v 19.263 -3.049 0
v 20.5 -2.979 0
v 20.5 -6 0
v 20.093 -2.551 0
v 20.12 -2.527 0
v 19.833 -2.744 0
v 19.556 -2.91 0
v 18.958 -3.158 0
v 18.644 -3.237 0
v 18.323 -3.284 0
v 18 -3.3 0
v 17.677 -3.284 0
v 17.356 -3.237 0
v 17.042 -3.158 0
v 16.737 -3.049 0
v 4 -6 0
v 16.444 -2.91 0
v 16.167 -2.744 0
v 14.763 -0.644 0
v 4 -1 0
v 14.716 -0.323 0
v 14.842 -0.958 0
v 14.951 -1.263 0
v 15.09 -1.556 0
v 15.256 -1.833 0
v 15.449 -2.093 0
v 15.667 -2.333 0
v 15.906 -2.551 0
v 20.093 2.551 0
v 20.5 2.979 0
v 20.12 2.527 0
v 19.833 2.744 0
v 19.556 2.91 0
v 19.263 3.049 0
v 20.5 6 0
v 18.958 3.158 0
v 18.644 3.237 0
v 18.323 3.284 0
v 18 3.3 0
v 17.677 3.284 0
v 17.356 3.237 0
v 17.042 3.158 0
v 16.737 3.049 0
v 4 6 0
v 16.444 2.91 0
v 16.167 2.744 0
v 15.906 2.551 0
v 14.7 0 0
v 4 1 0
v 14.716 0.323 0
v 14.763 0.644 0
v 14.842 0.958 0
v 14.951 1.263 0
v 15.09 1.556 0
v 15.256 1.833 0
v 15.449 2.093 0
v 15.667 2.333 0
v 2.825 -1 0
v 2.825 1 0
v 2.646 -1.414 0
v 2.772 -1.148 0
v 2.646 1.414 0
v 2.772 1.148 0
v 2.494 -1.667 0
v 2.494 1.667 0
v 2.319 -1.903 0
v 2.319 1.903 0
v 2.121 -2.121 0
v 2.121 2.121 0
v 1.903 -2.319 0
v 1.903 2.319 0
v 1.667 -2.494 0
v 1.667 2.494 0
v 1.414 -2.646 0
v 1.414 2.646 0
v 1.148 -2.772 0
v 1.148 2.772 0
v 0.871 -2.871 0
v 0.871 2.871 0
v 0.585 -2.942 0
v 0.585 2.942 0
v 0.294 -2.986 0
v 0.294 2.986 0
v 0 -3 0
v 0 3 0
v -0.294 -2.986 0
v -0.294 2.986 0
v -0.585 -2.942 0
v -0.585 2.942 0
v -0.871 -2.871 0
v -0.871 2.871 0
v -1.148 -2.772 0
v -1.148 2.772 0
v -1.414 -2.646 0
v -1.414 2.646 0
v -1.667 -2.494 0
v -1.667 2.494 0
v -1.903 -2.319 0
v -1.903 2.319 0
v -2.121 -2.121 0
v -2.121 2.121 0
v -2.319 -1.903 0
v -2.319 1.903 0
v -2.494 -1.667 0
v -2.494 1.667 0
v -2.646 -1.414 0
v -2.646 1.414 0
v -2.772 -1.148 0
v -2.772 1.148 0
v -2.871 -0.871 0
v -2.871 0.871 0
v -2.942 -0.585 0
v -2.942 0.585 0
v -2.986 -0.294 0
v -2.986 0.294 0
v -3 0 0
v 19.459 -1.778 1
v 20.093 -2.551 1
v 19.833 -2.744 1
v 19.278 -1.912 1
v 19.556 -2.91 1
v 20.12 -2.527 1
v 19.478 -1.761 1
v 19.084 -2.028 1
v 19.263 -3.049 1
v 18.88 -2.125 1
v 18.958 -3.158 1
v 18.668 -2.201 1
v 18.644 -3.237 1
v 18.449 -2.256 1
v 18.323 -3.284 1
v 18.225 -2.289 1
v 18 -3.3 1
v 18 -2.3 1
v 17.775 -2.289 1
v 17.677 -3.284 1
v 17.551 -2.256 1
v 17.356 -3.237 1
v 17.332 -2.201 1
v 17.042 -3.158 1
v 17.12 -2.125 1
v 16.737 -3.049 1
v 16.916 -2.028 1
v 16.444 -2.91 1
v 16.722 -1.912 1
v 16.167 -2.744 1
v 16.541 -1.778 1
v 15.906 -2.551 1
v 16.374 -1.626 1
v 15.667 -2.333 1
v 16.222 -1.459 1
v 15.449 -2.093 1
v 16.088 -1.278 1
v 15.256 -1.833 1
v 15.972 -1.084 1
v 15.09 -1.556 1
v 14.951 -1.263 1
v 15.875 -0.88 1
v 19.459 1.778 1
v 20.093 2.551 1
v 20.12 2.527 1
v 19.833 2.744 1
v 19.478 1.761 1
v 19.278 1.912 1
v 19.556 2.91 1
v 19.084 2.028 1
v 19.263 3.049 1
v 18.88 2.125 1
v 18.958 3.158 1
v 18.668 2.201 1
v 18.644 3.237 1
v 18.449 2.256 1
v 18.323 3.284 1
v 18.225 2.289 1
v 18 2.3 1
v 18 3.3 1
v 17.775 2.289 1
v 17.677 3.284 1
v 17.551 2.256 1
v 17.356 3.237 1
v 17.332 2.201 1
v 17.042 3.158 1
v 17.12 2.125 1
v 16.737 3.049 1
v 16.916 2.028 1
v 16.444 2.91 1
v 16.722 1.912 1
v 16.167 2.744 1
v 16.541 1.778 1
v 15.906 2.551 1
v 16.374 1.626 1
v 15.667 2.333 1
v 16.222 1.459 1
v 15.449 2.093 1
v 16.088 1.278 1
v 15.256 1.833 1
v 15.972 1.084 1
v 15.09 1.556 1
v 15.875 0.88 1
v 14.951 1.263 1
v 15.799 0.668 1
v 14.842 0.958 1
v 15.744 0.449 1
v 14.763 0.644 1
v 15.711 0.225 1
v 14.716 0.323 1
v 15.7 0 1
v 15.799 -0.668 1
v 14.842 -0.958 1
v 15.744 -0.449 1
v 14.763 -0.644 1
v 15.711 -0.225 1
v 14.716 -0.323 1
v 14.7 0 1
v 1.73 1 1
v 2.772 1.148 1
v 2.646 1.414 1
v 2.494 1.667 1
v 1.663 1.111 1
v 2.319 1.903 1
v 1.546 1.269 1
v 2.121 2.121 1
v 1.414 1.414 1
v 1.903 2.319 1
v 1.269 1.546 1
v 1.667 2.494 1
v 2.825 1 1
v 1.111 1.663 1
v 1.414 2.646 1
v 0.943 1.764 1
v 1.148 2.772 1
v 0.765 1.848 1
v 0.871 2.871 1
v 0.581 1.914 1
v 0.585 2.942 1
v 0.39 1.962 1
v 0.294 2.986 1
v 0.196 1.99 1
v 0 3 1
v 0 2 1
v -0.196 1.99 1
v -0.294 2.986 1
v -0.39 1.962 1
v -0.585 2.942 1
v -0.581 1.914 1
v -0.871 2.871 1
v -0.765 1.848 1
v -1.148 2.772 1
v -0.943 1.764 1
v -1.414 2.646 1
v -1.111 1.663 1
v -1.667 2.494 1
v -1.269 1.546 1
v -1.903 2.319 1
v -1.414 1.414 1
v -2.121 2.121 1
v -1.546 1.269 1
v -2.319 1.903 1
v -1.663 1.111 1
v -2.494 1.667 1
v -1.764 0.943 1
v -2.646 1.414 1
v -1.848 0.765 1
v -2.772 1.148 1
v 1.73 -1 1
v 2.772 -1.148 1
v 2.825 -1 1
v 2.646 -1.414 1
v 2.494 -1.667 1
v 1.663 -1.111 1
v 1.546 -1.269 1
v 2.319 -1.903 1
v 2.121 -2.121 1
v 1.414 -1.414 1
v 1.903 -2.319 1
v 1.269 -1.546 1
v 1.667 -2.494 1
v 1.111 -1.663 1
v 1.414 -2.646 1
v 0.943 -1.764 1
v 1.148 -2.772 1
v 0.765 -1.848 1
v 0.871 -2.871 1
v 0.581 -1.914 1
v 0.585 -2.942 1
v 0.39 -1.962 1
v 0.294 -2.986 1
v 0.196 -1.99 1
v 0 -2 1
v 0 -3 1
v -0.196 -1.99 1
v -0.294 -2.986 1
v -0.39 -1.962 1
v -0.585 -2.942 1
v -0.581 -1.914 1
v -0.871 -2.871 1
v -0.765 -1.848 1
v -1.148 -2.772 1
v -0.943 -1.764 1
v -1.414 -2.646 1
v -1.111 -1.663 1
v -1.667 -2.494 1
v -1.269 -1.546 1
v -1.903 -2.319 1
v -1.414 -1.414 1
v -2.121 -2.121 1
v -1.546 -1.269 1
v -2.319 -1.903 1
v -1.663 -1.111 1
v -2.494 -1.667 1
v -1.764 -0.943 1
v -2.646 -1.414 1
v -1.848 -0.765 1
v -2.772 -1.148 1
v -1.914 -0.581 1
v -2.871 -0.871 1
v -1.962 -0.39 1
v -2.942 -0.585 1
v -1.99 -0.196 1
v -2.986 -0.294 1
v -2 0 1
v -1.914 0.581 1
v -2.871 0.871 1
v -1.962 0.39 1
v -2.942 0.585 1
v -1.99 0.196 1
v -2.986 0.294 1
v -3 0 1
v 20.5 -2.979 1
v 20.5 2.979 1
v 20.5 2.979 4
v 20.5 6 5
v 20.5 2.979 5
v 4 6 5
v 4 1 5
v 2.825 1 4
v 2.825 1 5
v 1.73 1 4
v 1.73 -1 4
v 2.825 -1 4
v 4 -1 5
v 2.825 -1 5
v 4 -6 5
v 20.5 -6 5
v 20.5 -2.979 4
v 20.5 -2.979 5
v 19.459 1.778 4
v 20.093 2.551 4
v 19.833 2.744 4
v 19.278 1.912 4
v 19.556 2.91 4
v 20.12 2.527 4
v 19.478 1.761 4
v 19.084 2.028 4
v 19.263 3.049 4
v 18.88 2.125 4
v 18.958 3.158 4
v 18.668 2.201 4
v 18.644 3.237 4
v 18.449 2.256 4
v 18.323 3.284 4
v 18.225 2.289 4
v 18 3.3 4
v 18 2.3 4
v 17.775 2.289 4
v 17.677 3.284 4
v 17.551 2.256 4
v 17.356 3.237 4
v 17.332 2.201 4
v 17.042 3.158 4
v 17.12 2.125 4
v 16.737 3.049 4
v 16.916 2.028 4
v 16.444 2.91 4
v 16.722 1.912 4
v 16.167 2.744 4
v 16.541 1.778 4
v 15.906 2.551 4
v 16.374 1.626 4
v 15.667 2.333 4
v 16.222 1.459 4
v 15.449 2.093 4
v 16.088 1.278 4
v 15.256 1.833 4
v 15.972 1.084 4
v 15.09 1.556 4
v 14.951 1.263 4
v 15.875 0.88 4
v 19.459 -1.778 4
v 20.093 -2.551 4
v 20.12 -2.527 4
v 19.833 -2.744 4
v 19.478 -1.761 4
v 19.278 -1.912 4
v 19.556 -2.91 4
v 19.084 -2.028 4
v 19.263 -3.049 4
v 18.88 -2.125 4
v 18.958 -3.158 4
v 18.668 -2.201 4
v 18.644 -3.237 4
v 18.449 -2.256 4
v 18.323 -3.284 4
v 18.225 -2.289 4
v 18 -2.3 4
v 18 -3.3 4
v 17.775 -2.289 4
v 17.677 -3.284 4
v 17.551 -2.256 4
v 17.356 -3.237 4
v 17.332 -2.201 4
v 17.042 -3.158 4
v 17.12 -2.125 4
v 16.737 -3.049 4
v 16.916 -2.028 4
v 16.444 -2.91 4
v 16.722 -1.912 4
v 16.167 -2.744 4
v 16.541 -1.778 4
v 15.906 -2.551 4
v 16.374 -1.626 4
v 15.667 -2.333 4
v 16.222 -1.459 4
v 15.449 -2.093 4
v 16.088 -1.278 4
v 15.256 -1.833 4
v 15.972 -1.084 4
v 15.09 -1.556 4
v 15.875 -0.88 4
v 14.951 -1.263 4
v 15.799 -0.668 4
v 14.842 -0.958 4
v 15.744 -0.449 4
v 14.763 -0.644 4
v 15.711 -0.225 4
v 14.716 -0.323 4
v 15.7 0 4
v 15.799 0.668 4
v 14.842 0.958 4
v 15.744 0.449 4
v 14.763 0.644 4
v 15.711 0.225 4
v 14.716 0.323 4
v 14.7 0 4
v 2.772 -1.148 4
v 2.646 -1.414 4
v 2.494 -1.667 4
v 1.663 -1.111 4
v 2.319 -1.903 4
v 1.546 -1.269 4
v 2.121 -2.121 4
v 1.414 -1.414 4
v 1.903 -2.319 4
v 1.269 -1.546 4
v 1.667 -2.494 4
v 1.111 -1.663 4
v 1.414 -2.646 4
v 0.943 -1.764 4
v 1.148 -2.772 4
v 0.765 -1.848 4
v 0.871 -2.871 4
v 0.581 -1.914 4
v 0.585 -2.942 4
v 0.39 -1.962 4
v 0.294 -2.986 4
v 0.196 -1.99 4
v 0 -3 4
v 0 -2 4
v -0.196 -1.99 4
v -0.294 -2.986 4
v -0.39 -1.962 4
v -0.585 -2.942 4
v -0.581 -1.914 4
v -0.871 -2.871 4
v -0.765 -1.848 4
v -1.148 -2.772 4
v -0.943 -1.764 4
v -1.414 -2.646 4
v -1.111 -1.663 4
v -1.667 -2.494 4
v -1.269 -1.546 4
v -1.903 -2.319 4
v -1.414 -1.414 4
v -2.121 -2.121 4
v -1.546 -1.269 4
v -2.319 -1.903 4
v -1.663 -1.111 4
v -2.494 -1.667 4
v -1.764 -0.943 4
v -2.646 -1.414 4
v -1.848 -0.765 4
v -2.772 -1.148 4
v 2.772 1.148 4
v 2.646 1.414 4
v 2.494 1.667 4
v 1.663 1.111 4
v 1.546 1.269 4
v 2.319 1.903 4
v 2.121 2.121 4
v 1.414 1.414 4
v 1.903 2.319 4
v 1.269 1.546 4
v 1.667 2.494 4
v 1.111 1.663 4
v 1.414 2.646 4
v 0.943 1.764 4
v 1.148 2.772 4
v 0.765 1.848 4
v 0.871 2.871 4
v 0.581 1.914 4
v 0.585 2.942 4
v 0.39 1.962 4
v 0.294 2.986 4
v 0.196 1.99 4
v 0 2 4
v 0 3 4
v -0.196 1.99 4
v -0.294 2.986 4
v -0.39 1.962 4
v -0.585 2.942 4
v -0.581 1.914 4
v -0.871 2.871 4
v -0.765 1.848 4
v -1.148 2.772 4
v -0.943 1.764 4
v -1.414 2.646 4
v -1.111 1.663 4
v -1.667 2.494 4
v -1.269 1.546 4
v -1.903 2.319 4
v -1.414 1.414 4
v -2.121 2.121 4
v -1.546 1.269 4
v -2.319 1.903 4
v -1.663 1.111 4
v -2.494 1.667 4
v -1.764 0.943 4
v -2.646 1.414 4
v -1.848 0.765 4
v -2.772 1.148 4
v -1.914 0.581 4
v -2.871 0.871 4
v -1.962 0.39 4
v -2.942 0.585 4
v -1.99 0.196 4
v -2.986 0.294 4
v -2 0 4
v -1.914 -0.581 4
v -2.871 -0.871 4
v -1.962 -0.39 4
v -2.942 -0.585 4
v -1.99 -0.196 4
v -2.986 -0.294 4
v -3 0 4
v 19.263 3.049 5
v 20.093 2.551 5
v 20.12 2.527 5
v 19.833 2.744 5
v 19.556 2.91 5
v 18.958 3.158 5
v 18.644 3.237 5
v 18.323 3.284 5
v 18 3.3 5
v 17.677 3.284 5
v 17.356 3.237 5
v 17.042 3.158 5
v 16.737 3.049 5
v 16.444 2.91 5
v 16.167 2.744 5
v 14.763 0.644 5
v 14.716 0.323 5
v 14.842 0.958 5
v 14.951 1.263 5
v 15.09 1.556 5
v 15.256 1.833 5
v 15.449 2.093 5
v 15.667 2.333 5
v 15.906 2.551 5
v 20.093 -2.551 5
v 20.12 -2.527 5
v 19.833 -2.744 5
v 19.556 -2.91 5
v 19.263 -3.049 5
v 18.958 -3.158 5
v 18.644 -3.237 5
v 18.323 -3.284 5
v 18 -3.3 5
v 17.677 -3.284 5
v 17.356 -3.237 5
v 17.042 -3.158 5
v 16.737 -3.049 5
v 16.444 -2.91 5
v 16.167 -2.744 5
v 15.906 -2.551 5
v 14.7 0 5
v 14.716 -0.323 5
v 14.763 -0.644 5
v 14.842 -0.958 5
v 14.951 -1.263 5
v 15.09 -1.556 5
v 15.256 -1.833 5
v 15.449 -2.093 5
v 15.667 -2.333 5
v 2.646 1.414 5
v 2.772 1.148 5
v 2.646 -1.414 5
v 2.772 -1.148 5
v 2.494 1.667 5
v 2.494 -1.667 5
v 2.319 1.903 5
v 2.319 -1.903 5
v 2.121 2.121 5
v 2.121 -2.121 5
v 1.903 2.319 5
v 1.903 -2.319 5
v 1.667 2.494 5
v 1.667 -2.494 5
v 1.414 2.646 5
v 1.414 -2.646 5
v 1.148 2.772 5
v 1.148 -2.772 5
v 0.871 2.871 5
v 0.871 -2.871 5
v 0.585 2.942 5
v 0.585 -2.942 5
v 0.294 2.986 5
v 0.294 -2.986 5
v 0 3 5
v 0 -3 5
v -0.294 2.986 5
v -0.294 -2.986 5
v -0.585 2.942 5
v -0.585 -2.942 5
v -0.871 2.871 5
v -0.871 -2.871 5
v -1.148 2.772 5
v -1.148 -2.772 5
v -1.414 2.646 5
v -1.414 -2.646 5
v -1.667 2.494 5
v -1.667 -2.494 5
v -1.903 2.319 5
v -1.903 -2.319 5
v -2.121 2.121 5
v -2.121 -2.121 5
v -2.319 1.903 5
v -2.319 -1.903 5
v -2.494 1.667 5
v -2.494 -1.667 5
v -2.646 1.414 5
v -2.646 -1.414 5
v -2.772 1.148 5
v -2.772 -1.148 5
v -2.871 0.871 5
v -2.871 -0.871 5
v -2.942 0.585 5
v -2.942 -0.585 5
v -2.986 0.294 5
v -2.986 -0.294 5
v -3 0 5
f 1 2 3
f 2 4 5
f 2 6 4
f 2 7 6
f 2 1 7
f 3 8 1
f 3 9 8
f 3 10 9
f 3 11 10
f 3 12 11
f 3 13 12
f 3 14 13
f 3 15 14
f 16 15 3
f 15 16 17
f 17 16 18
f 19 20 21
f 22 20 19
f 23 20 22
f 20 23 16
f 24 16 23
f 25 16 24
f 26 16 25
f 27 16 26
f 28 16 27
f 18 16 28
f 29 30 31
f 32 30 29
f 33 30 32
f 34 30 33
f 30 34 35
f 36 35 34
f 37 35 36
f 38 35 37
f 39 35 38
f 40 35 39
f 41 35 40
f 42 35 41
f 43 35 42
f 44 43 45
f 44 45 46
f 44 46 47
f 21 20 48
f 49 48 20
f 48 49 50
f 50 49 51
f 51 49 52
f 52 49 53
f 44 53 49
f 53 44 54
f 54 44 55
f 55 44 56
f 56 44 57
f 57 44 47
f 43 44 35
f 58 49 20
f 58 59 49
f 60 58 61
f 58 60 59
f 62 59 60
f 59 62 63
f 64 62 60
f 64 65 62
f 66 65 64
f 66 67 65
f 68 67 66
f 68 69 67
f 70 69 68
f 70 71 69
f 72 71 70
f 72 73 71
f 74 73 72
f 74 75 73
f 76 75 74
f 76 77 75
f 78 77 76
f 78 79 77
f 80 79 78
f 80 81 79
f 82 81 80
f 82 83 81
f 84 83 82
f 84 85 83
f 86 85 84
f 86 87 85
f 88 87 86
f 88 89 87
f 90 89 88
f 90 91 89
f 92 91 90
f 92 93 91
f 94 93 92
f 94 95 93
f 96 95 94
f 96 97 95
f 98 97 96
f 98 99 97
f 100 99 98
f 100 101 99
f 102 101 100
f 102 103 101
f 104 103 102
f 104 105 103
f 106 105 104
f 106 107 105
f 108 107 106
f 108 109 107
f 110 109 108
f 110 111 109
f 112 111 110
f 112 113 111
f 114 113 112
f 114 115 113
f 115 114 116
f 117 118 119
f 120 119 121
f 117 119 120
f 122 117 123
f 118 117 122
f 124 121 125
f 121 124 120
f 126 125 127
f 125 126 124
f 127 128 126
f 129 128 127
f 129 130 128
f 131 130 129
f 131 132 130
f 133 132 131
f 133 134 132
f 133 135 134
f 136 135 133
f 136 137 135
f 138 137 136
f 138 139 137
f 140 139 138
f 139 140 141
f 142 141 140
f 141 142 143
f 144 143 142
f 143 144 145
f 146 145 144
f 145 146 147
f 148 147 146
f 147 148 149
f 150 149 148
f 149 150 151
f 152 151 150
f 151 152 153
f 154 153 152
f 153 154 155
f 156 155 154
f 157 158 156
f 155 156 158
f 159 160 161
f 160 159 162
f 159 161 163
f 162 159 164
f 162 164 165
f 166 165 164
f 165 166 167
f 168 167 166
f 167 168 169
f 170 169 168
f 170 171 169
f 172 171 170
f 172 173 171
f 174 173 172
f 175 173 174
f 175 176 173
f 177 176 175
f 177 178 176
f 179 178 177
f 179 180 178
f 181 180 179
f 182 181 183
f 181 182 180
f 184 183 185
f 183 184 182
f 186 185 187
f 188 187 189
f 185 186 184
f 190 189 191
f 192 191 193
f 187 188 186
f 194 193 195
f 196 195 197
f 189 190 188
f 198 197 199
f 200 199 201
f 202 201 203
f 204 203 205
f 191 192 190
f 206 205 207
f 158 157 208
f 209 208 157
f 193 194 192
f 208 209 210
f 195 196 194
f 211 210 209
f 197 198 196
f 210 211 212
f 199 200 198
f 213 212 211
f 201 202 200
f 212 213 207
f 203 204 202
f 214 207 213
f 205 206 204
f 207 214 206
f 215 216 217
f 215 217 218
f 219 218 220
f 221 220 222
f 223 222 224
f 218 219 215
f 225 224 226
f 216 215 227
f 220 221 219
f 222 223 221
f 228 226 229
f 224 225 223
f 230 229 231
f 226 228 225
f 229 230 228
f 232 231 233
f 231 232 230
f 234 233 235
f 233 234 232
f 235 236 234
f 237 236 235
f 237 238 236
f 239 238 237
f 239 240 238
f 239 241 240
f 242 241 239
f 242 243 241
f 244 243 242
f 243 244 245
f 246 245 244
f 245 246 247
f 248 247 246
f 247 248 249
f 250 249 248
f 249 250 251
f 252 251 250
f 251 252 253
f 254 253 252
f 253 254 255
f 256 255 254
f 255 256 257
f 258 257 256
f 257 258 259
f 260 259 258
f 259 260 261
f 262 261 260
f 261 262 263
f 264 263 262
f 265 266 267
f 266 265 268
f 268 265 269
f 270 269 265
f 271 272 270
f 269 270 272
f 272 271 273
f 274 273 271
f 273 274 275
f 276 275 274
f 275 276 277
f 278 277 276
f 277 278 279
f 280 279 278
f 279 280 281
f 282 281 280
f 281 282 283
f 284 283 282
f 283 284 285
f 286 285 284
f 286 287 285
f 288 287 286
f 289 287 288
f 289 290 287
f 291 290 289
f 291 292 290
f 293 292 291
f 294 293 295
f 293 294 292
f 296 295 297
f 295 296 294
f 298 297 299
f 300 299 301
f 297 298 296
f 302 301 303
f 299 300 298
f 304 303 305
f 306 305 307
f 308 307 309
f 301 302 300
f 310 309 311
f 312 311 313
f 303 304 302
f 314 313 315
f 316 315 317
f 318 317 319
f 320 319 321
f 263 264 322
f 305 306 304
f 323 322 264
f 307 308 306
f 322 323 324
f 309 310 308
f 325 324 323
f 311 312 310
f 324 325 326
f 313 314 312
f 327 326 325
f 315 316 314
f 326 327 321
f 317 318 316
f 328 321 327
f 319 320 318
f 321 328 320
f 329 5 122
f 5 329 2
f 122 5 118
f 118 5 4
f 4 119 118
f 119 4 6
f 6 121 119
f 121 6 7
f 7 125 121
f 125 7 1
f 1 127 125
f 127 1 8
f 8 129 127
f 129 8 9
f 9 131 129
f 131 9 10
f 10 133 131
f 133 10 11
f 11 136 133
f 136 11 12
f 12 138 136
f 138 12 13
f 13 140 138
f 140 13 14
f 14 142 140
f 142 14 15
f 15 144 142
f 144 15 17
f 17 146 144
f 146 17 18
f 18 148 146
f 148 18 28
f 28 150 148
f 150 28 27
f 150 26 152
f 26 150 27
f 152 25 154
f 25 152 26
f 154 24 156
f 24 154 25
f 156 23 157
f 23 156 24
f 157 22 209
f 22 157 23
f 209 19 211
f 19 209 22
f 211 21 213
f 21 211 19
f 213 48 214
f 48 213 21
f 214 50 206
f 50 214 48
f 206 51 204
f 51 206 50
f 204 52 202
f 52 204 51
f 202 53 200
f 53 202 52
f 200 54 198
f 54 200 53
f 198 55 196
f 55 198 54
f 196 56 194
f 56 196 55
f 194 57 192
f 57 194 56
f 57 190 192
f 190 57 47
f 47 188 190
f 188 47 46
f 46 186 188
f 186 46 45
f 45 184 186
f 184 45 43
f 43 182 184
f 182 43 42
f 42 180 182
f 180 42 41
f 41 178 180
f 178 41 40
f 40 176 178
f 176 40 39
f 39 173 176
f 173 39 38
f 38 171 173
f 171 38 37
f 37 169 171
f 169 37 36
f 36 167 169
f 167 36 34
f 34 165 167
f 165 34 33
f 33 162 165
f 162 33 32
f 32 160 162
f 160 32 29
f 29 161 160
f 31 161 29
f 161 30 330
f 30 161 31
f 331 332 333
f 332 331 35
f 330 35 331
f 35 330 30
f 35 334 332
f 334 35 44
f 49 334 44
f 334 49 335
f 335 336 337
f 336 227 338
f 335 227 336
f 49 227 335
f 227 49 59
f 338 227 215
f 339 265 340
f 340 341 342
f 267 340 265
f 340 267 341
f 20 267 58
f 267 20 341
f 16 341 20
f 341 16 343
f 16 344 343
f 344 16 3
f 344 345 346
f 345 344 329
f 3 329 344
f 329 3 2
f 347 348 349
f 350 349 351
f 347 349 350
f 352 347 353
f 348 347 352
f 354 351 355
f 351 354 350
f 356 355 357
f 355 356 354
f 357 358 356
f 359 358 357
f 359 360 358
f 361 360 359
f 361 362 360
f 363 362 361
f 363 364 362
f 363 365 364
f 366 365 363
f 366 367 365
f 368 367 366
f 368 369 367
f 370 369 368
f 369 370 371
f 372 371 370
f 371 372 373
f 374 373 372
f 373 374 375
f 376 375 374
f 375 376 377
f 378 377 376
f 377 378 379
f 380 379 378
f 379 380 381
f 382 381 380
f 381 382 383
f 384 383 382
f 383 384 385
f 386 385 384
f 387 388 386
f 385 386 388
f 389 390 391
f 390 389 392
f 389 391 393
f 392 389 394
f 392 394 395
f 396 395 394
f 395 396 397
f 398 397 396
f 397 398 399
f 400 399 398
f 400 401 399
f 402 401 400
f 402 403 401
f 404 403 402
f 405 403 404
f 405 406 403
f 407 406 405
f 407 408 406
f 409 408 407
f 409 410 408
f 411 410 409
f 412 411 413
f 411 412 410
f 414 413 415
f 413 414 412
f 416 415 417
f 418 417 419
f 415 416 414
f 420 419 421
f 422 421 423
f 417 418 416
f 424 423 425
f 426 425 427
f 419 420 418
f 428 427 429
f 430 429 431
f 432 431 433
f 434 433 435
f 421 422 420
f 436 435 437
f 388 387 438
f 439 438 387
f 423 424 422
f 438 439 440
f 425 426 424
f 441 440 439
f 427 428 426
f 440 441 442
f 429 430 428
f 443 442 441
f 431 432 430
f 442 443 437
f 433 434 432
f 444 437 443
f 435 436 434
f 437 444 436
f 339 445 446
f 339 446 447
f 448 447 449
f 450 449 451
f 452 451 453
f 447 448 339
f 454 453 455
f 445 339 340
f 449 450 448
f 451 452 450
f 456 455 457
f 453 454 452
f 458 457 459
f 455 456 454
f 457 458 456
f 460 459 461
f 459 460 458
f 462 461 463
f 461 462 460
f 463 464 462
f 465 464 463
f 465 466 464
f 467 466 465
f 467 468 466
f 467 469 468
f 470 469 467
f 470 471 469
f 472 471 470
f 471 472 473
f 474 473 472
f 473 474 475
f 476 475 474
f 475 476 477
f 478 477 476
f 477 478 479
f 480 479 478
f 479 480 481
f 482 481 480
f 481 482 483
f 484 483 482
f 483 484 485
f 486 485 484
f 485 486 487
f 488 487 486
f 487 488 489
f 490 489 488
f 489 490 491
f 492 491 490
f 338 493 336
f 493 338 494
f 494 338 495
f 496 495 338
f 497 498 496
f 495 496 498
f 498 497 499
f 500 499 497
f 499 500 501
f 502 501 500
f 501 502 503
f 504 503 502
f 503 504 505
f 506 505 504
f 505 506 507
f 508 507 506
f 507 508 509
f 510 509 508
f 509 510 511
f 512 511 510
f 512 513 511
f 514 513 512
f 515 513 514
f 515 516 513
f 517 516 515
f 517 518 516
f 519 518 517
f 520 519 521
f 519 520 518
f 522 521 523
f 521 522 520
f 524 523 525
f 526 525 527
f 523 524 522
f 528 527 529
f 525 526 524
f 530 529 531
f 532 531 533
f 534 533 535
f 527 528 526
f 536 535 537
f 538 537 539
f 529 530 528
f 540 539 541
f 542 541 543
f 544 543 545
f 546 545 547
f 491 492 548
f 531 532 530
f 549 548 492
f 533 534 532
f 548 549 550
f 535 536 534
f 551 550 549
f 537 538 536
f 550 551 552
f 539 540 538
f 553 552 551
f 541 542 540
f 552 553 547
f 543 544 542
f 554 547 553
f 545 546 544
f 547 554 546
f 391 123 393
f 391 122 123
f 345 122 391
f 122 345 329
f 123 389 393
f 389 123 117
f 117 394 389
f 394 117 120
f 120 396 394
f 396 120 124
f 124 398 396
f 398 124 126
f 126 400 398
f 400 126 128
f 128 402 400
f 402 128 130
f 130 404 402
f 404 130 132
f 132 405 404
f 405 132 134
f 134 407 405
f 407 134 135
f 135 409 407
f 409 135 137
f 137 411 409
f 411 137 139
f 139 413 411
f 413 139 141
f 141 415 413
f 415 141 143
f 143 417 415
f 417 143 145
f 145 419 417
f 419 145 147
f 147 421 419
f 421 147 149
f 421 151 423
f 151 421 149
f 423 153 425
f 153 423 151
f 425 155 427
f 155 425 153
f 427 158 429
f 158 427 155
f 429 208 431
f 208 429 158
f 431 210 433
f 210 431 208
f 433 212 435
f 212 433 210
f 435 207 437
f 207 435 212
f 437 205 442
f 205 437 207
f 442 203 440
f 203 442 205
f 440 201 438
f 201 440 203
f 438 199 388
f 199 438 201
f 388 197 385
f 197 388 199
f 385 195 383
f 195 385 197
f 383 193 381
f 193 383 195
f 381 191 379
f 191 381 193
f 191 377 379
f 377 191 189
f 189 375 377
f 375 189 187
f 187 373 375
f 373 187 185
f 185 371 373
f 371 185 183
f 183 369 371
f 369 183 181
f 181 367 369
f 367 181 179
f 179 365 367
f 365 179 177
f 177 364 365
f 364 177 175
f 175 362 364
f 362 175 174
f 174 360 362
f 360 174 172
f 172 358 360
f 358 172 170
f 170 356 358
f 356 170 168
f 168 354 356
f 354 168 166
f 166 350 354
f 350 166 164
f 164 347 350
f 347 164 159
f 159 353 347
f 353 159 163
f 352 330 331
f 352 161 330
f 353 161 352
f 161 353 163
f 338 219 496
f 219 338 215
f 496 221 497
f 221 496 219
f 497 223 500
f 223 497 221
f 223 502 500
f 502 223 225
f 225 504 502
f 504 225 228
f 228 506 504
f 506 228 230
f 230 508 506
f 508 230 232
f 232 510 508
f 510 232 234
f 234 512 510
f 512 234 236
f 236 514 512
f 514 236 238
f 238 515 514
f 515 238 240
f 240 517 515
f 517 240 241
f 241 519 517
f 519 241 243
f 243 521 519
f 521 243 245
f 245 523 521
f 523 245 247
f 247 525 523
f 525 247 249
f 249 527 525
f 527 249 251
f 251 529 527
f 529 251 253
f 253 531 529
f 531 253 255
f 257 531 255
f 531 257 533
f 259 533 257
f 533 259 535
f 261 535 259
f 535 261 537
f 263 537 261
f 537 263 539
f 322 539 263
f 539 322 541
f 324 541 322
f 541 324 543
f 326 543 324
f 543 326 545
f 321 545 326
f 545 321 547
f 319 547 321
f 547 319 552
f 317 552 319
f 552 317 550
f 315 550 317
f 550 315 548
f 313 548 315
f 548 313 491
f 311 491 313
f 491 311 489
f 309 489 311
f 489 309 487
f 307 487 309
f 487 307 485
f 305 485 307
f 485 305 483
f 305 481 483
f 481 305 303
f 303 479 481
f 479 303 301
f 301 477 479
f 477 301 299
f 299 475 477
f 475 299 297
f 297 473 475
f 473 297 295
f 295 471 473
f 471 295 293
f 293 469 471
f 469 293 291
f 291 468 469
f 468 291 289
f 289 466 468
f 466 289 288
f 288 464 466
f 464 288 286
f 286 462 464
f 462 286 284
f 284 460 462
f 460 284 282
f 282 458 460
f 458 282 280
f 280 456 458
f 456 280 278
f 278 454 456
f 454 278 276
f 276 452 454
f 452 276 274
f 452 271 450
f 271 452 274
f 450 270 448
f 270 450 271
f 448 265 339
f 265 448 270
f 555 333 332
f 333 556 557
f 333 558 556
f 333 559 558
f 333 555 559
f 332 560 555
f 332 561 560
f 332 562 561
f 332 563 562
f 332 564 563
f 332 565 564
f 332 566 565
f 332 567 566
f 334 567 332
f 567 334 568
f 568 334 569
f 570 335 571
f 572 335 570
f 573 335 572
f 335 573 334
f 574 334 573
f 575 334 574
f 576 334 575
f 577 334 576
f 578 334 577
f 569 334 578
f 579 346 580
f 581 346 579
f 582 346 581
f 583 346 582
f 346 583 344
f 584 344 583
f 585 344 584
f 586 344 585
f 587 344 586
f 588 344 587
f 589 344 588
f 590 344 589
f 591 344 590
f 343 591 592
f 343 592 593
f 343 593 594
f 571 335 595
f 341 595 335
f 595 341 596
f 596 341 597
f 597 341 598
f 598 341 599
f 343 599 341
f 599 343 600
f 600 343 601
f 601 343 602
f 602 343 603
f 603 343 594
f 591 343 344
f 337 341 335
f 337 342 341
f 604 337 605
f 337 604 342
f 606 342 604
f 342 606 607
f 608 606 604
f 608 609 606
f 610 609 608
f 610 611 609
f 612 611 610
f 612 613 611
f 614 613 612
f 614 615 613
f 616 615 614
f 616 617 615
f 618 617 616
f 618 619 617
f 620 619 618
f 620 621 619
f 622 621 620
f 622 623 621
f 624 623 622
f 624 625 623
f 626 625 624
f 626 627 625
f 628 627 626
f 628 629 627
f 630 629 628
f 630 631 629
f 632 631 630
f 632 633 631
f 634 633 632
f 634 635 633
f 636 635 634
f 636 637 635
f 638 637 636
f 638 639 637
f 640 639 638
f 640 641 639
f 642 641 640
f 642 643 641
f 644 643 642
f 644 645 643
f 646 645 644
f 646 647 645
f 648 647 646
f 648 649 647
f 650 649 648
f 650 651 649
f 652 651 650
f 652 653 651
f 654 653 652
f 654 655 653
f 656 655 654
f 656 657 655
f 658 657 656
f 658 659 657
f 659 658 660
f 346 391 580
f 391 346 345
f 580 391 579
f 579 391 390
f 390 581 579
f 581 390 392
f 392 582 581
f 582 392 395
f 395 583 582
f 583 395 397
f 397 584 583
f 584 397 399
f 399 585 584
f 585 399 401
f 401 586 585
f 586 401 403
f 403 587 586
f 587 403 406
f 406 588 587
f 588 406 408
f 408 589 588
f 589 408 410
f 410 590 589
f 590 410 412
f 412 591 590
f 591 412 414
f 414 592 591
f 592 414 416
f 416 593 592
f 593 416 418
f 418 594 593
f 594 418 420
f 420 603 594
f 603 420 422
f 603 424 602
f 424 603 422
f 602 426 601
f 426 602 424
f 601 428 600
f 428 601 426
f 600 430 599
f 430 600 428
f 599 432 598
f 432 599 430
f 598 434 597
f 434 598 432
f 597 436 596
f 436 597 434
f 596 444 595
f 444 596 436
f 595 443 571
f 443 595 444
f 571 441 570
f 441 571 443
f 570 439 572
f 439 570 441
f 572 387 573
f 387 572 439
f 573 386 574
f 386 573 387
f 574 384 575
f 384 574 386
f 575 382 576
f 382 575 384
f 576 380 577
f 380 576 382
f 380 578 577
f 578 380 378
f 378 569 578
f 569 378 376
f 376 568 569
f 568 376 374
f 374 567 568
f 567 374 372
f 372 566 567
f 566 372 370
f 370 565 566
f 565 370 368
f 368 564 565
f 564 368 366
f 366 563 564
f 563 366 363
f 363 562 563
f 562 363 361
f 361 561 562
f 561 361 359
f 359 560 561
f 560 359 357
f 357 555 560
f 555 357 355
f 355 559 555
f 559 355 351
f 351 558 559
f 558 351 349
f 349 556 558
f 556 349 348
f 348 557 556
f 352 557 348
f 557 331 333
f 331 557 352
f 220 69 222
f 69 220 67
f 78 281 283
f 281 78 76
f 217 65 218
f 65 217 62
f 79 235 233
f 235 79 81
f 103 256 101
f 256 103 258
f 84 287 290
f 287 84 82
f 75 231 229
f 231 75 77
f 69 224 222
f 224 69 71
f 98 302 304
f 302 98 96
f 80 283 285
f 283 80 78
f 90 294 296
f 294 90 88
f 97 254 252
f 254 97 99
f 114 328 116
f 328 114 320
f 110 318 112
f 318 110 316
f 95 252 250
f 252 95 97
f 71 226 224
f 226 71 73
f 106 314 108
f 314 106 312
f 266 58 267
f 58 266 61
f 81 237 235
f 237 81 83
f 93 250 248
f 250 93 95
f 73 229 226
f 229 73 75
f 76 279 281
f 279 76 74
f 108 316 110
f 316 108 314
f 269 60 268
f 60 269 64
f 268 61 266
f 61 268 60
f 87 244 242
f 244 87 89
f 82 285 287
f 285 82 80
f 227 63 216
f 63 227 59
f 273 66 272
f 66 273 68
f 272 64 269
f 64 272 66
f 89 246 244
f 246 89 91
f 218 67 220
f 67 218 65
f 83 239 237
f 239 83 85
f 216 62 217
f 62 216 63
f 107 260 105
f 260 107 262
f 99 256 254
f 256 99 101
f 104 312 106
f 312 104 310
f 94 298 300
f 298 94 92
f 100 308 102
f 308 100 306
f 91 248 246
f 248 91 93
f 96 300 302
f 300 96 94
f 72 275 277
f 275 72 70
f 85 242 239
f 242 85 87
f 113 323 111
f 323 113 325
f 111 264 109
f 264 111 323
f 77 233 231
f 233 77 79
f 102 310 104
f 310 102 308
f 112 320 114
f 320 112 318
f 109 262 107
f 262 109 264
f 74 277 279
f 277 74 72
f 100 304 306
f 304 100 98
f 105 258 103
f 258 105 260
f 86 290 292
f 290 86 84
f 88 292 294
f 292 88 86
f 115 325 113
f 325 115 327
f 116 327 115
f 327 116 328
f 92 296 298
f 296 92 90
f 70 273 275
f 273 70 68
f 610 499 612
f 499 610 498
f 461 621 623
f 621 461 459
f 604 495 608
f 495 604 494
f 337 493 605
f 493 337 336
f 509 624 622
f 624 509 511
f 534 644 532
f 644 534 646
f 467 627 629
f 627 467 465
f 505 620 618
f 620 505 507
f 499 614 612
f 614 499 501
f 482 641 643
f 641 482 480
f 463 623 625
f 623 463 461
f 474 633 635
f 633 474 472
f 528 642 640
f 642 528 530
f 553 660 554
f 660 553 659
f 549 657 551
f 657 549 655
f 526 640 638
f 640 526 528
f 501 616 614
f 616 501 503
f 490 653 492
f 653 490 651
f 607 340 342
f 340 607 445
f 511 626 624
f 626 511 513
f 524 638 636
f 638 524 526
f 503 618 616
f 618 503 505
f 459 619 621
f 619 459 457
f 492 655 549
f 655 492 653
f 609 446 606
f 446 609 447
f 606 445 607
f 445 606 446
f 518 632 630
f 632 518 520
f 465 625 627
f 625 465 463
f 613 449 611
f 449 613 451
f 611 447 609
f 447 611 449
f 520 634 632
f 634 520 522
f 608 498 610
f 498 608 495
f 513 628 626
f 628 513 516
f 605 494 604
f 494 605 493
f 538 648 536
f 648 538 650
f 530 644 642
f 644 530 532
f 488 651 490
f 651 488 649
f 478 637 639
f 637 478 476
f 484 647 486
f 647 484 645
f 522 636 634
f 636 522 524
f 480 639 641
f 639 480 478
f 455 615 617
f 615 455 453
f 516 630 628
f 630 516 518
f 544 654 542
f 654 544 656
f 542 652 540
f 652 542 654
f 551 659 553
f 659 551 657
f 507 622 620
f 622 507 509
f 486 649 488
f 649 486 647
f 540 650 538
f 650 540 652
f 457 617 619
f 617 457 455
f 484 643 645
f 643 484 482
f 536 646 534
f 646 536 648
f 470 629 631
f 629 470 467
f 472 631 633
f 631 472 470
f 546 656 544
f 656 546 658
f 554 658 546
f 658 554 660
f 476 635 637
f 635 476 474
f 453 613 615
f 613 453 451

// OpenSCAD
part = "link"; // [link, assembly]
cadverify_only = "";
module instance(name, part, unit = 1) {
    echo(cadverify_instance = [name, part, unit]);
    if (cadverify_only == "" || cadverify_only == name) children();
}

// Parameters (mm)
pitch = 18;          // pin-to-bore distance
link_w = 12;         // width (Y)
link_t = 5;          // thickness (Z)
pin_d = 4;           // pin shaft diameter
bore_d = 4.6;        // bore diameter (0.3 radial clearance)
cap_d = 6;           // cap diameter
cap_h = 1;           // cap thickness
gap_z = 0.3;         // vertical clearance cap<->knuckle
kn_out_d = 7.6;      // knuckle outer diameter (1.5 wall)
cap_cav_d = 6.6;     // cap cavity diameter (0.3 radial clearance)
neck_w = 2;          // neck width
slot_half = 50;      // slot half-angle (deg), allows +-30 deg swing
yoke_east = 20.5;    // full-height yoke east extent (local X)
$fn = 64;

module link_geom() {
    bore_x = pitch;
    pin_r = pin_d/2;
    bore_r = bore_d/2;
    kn_out_r = kn_out_d/2;
    cav_r = cap_cav_d/2;
    cap_r = cap_d/2;
    wedge_far = 30;
    dy_far = wedge_far * tan(slot_half);
    // 2D profiles
    // base footprint (bottom/top): pin disc + neck + yoke rect
    // mid footprint: base + knuckle outer disc
    bot_h = cap_h;            // 0..1
    mid_h = link_t - 2*cap_h; // 1..4
    // bottom layer z 0..1, hole = cap cavity r3.3
    translate([0,0,0]) linear_extrude(height = bot_h, convexity = 8) {
        difference() {
            union() {
                circle(r = pin_r);
                translate([0,-neck_w/2]) square([5, neck_w]);
                translate([4,-link_w/2]) square([yoke_east-4, link_w]);
            }
            translate([bore_x,0]) circle(r = cav_r);
            polygon(points = [[bore_x,0],[bore_x+wedge_far, dy_far],[bore_x+wedge_far, -dy_far]]);
        }
    }
    // middle layer z 1..4, hole = bore r2.3
    translate([0,0,bot_h]) linear_extrude(height = mid_h, convexity = 8) {
        difference() {
            union() {
                circle(r = pin_r);
                translate([0,-neck_w/2]) square([5, neck_w]);
                translate([4,-link_w/2]) square([yoke_east-4, link_w]);
                translate([bore_x,0]) circle(r = kn_out_r);
            }
            translate([bore_x,0]) circle(r = bore_r);
            polygon(points = [[bore_x,0],[bore_x+wedge_far, dy_far],[bore_x+wedge_far, -dy_far]]);
        }
    }
    // top layer z 4..5, hole = cap cavity r3.3
    translate([0,0,bot_h+mid_h]) linear_extrude(height = bot_h, convexity = 8) {
        difference() {
            union() {
                circle(r = pin_r);
                translate([0,-neck_w/2]) square([5, neck_w]);
                translate([4,-link_w/2]) square([yoke_east-4, link_w]);
            }
            translate([bore_x,0]) circle(r = cav_r);
            polygon(points = [[bore_x,0],[bore_x+wedge_far, dy_far],[bore_x+wedge_far, -dy_far]]);
        }
    }
    // caps (pin ends)
    translate([0,0,0]) cylinder(h = cap_h, r = cap_r);
    translate([0,0,link_t-cap_h]) cylinder(h = cap_h, r = cap_r);
}

if (part == "assembly") {
    instance("link1", "link", 1) translate([0,0,0]) link_geom();
    instance("link2", "link", 1) translate([18,0,0]) link_geom();
    instance("link3", "link", 1) translate([36,0,0]) link_geom();
    echo(cadverify_spec = [
        ["bounds", [[-3, -6, 0], [56.5, 6, 5]]],
        ["support_faces", [["bed", "-z", 200]]],
        ["motions", [
            ["bend", ["link3"], "rotate", [36, 0, 0], [0, 0, 1], [-30, 30]]
        ]],
        ["assembly_order", [
            [["link1", "link2", "link3"], [0, 0, 0]]
        ]],
        ["print_in_place", 0.3],
        ["overhangs_allowed", [
            ["pin cap link1", [[-3, -3, 3.8], [3, 3, 4.2]]],
            ["knuckle joint1", [[14.5, -3.5, 1.0], [21, 3.5, 1.5]]],
            ["pin cap link2", [[15, -3, 3.8], [21, 3, 4.2]]],
            ["knuckle joint2", [[32.5, -3.5, 1.0], [39, 3.5, 1.5]]],
            ["pin cap link3", [[33, -3, 3.8], [39, 3, 4.2]]],
            ["knuckle end", [[50.5, -3.5, 1.0], [57, 3.5, 1.5]]]
        ]],
        ["held", ["link1", "link2", "link3"]]
    ]);
} else {
    link_geom();
    echo(cadverify_spec = [
        ["bounds", [[-3, -6, 0], [20.5, 6, 5]]],
        ["bodies", 1],
        ["through_holes", 0],
        ["support_faces", [["bed", "-z", 100]]],
        ["overhangs_allowed", [
            ["pin cap", [[-3, -3, 3.8], [3, 3, 4.2]]],
            ["knuckle ceiling", [[14.5, -3.5, 1.0], [21, 3.5, 1.5]]]
        ]],
        ["copies", 3],
        ["details", [
            ["body", "material", [[4, -6, 0], [14, 6, 5]], 0.85],
            ["neck", "material", [[0, -1, 0], [5, 1, 5]], 0.8],
            ["knuckle", "material", [[14.2, -3.8, 1.3], [21.8, 3.8, 3.7]], 0.25],
            ["slot", "void", [[19, -1, 0], [21, 1, 5]], 0.8],
            ["cap_cavity", "void", [[14.7, -3.3, 0], [21.3, 3.3, 1]], 0.5],
            ["wall", "thickness", [18, 7, 2.5], [0, -1, 0], 3.7],
            ["floor", "thickness", [9, 0, -1], [0, 0, 1], 5]
        ]]
    ]);
}
